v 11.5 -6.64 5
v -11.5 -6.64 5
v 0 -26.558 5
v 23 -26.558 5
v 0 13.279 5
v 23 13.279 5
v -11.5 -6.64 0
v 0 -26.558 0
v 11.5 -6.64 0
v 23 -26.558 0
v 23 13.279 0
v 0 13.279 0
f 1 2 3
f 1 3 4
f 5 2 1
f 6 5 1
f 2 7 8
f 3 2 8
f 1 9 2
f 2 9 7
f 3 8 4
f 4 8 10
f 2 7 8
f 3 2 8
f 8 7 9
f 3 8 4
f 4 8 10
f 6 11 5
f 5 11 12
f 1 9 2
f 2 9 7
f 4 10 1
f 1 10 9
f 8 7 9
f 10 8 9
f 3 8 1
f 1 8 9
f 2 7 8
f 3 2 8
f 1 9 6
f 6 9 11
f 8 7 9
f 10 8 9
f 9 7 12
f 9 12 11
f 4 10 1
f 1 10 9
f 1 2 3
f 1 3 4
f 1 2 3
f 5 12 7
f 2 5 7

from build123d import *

# Parameters (mm, degrees)
F1_DEPTH = 5
F2_DEPTH = 5
F3_DEPTH = 5


with BuildPart() as f1:
    # F0 (on Top) → F1 (new body)
    with BuildSketch(Plane.XY):
        Polygon((23, -26.558112), (11.5, -6.639528), (0, -26.558112), align=None)
        Polygon((11.5, -6.639528), (0, 13.279056), (-11.5, -6.639528), align=None)
        Polygon((0, -26.558112), (11.5, -6.639528), (-11.5, -6.639528), align=None)
        Polygon((23, 13.279056), (0, 13.279056), (11.5, -6.639528), align=None)
    extrude(amount=F1_DEPTH)


with BuildPart() as f2:
    # F0 (on Top) → F2 (new body)
    with BuildSketch(Plane.XY):
        Polygon((23, -26.558112), (11.5, -6.639528), (0, -26.558112), align=None)
        Polygon((0, -26.558112), (11.5, -6.639528), (-11.5, -6.639528), align=None)
    extrude(amount=F2_DEPTH)


with BuildPart() as f3:
    # F0 (on Top) → F3 (new body)
    with BuildSketch(Plane.XY):
        Polygon((0, -26.558112), (11.5, -6.639528), (-11.5, -6.639528), align=None)
    extrude(amount=F3_DEPTH)


solid = Compound([f1.part, f2.part, f3.part])
